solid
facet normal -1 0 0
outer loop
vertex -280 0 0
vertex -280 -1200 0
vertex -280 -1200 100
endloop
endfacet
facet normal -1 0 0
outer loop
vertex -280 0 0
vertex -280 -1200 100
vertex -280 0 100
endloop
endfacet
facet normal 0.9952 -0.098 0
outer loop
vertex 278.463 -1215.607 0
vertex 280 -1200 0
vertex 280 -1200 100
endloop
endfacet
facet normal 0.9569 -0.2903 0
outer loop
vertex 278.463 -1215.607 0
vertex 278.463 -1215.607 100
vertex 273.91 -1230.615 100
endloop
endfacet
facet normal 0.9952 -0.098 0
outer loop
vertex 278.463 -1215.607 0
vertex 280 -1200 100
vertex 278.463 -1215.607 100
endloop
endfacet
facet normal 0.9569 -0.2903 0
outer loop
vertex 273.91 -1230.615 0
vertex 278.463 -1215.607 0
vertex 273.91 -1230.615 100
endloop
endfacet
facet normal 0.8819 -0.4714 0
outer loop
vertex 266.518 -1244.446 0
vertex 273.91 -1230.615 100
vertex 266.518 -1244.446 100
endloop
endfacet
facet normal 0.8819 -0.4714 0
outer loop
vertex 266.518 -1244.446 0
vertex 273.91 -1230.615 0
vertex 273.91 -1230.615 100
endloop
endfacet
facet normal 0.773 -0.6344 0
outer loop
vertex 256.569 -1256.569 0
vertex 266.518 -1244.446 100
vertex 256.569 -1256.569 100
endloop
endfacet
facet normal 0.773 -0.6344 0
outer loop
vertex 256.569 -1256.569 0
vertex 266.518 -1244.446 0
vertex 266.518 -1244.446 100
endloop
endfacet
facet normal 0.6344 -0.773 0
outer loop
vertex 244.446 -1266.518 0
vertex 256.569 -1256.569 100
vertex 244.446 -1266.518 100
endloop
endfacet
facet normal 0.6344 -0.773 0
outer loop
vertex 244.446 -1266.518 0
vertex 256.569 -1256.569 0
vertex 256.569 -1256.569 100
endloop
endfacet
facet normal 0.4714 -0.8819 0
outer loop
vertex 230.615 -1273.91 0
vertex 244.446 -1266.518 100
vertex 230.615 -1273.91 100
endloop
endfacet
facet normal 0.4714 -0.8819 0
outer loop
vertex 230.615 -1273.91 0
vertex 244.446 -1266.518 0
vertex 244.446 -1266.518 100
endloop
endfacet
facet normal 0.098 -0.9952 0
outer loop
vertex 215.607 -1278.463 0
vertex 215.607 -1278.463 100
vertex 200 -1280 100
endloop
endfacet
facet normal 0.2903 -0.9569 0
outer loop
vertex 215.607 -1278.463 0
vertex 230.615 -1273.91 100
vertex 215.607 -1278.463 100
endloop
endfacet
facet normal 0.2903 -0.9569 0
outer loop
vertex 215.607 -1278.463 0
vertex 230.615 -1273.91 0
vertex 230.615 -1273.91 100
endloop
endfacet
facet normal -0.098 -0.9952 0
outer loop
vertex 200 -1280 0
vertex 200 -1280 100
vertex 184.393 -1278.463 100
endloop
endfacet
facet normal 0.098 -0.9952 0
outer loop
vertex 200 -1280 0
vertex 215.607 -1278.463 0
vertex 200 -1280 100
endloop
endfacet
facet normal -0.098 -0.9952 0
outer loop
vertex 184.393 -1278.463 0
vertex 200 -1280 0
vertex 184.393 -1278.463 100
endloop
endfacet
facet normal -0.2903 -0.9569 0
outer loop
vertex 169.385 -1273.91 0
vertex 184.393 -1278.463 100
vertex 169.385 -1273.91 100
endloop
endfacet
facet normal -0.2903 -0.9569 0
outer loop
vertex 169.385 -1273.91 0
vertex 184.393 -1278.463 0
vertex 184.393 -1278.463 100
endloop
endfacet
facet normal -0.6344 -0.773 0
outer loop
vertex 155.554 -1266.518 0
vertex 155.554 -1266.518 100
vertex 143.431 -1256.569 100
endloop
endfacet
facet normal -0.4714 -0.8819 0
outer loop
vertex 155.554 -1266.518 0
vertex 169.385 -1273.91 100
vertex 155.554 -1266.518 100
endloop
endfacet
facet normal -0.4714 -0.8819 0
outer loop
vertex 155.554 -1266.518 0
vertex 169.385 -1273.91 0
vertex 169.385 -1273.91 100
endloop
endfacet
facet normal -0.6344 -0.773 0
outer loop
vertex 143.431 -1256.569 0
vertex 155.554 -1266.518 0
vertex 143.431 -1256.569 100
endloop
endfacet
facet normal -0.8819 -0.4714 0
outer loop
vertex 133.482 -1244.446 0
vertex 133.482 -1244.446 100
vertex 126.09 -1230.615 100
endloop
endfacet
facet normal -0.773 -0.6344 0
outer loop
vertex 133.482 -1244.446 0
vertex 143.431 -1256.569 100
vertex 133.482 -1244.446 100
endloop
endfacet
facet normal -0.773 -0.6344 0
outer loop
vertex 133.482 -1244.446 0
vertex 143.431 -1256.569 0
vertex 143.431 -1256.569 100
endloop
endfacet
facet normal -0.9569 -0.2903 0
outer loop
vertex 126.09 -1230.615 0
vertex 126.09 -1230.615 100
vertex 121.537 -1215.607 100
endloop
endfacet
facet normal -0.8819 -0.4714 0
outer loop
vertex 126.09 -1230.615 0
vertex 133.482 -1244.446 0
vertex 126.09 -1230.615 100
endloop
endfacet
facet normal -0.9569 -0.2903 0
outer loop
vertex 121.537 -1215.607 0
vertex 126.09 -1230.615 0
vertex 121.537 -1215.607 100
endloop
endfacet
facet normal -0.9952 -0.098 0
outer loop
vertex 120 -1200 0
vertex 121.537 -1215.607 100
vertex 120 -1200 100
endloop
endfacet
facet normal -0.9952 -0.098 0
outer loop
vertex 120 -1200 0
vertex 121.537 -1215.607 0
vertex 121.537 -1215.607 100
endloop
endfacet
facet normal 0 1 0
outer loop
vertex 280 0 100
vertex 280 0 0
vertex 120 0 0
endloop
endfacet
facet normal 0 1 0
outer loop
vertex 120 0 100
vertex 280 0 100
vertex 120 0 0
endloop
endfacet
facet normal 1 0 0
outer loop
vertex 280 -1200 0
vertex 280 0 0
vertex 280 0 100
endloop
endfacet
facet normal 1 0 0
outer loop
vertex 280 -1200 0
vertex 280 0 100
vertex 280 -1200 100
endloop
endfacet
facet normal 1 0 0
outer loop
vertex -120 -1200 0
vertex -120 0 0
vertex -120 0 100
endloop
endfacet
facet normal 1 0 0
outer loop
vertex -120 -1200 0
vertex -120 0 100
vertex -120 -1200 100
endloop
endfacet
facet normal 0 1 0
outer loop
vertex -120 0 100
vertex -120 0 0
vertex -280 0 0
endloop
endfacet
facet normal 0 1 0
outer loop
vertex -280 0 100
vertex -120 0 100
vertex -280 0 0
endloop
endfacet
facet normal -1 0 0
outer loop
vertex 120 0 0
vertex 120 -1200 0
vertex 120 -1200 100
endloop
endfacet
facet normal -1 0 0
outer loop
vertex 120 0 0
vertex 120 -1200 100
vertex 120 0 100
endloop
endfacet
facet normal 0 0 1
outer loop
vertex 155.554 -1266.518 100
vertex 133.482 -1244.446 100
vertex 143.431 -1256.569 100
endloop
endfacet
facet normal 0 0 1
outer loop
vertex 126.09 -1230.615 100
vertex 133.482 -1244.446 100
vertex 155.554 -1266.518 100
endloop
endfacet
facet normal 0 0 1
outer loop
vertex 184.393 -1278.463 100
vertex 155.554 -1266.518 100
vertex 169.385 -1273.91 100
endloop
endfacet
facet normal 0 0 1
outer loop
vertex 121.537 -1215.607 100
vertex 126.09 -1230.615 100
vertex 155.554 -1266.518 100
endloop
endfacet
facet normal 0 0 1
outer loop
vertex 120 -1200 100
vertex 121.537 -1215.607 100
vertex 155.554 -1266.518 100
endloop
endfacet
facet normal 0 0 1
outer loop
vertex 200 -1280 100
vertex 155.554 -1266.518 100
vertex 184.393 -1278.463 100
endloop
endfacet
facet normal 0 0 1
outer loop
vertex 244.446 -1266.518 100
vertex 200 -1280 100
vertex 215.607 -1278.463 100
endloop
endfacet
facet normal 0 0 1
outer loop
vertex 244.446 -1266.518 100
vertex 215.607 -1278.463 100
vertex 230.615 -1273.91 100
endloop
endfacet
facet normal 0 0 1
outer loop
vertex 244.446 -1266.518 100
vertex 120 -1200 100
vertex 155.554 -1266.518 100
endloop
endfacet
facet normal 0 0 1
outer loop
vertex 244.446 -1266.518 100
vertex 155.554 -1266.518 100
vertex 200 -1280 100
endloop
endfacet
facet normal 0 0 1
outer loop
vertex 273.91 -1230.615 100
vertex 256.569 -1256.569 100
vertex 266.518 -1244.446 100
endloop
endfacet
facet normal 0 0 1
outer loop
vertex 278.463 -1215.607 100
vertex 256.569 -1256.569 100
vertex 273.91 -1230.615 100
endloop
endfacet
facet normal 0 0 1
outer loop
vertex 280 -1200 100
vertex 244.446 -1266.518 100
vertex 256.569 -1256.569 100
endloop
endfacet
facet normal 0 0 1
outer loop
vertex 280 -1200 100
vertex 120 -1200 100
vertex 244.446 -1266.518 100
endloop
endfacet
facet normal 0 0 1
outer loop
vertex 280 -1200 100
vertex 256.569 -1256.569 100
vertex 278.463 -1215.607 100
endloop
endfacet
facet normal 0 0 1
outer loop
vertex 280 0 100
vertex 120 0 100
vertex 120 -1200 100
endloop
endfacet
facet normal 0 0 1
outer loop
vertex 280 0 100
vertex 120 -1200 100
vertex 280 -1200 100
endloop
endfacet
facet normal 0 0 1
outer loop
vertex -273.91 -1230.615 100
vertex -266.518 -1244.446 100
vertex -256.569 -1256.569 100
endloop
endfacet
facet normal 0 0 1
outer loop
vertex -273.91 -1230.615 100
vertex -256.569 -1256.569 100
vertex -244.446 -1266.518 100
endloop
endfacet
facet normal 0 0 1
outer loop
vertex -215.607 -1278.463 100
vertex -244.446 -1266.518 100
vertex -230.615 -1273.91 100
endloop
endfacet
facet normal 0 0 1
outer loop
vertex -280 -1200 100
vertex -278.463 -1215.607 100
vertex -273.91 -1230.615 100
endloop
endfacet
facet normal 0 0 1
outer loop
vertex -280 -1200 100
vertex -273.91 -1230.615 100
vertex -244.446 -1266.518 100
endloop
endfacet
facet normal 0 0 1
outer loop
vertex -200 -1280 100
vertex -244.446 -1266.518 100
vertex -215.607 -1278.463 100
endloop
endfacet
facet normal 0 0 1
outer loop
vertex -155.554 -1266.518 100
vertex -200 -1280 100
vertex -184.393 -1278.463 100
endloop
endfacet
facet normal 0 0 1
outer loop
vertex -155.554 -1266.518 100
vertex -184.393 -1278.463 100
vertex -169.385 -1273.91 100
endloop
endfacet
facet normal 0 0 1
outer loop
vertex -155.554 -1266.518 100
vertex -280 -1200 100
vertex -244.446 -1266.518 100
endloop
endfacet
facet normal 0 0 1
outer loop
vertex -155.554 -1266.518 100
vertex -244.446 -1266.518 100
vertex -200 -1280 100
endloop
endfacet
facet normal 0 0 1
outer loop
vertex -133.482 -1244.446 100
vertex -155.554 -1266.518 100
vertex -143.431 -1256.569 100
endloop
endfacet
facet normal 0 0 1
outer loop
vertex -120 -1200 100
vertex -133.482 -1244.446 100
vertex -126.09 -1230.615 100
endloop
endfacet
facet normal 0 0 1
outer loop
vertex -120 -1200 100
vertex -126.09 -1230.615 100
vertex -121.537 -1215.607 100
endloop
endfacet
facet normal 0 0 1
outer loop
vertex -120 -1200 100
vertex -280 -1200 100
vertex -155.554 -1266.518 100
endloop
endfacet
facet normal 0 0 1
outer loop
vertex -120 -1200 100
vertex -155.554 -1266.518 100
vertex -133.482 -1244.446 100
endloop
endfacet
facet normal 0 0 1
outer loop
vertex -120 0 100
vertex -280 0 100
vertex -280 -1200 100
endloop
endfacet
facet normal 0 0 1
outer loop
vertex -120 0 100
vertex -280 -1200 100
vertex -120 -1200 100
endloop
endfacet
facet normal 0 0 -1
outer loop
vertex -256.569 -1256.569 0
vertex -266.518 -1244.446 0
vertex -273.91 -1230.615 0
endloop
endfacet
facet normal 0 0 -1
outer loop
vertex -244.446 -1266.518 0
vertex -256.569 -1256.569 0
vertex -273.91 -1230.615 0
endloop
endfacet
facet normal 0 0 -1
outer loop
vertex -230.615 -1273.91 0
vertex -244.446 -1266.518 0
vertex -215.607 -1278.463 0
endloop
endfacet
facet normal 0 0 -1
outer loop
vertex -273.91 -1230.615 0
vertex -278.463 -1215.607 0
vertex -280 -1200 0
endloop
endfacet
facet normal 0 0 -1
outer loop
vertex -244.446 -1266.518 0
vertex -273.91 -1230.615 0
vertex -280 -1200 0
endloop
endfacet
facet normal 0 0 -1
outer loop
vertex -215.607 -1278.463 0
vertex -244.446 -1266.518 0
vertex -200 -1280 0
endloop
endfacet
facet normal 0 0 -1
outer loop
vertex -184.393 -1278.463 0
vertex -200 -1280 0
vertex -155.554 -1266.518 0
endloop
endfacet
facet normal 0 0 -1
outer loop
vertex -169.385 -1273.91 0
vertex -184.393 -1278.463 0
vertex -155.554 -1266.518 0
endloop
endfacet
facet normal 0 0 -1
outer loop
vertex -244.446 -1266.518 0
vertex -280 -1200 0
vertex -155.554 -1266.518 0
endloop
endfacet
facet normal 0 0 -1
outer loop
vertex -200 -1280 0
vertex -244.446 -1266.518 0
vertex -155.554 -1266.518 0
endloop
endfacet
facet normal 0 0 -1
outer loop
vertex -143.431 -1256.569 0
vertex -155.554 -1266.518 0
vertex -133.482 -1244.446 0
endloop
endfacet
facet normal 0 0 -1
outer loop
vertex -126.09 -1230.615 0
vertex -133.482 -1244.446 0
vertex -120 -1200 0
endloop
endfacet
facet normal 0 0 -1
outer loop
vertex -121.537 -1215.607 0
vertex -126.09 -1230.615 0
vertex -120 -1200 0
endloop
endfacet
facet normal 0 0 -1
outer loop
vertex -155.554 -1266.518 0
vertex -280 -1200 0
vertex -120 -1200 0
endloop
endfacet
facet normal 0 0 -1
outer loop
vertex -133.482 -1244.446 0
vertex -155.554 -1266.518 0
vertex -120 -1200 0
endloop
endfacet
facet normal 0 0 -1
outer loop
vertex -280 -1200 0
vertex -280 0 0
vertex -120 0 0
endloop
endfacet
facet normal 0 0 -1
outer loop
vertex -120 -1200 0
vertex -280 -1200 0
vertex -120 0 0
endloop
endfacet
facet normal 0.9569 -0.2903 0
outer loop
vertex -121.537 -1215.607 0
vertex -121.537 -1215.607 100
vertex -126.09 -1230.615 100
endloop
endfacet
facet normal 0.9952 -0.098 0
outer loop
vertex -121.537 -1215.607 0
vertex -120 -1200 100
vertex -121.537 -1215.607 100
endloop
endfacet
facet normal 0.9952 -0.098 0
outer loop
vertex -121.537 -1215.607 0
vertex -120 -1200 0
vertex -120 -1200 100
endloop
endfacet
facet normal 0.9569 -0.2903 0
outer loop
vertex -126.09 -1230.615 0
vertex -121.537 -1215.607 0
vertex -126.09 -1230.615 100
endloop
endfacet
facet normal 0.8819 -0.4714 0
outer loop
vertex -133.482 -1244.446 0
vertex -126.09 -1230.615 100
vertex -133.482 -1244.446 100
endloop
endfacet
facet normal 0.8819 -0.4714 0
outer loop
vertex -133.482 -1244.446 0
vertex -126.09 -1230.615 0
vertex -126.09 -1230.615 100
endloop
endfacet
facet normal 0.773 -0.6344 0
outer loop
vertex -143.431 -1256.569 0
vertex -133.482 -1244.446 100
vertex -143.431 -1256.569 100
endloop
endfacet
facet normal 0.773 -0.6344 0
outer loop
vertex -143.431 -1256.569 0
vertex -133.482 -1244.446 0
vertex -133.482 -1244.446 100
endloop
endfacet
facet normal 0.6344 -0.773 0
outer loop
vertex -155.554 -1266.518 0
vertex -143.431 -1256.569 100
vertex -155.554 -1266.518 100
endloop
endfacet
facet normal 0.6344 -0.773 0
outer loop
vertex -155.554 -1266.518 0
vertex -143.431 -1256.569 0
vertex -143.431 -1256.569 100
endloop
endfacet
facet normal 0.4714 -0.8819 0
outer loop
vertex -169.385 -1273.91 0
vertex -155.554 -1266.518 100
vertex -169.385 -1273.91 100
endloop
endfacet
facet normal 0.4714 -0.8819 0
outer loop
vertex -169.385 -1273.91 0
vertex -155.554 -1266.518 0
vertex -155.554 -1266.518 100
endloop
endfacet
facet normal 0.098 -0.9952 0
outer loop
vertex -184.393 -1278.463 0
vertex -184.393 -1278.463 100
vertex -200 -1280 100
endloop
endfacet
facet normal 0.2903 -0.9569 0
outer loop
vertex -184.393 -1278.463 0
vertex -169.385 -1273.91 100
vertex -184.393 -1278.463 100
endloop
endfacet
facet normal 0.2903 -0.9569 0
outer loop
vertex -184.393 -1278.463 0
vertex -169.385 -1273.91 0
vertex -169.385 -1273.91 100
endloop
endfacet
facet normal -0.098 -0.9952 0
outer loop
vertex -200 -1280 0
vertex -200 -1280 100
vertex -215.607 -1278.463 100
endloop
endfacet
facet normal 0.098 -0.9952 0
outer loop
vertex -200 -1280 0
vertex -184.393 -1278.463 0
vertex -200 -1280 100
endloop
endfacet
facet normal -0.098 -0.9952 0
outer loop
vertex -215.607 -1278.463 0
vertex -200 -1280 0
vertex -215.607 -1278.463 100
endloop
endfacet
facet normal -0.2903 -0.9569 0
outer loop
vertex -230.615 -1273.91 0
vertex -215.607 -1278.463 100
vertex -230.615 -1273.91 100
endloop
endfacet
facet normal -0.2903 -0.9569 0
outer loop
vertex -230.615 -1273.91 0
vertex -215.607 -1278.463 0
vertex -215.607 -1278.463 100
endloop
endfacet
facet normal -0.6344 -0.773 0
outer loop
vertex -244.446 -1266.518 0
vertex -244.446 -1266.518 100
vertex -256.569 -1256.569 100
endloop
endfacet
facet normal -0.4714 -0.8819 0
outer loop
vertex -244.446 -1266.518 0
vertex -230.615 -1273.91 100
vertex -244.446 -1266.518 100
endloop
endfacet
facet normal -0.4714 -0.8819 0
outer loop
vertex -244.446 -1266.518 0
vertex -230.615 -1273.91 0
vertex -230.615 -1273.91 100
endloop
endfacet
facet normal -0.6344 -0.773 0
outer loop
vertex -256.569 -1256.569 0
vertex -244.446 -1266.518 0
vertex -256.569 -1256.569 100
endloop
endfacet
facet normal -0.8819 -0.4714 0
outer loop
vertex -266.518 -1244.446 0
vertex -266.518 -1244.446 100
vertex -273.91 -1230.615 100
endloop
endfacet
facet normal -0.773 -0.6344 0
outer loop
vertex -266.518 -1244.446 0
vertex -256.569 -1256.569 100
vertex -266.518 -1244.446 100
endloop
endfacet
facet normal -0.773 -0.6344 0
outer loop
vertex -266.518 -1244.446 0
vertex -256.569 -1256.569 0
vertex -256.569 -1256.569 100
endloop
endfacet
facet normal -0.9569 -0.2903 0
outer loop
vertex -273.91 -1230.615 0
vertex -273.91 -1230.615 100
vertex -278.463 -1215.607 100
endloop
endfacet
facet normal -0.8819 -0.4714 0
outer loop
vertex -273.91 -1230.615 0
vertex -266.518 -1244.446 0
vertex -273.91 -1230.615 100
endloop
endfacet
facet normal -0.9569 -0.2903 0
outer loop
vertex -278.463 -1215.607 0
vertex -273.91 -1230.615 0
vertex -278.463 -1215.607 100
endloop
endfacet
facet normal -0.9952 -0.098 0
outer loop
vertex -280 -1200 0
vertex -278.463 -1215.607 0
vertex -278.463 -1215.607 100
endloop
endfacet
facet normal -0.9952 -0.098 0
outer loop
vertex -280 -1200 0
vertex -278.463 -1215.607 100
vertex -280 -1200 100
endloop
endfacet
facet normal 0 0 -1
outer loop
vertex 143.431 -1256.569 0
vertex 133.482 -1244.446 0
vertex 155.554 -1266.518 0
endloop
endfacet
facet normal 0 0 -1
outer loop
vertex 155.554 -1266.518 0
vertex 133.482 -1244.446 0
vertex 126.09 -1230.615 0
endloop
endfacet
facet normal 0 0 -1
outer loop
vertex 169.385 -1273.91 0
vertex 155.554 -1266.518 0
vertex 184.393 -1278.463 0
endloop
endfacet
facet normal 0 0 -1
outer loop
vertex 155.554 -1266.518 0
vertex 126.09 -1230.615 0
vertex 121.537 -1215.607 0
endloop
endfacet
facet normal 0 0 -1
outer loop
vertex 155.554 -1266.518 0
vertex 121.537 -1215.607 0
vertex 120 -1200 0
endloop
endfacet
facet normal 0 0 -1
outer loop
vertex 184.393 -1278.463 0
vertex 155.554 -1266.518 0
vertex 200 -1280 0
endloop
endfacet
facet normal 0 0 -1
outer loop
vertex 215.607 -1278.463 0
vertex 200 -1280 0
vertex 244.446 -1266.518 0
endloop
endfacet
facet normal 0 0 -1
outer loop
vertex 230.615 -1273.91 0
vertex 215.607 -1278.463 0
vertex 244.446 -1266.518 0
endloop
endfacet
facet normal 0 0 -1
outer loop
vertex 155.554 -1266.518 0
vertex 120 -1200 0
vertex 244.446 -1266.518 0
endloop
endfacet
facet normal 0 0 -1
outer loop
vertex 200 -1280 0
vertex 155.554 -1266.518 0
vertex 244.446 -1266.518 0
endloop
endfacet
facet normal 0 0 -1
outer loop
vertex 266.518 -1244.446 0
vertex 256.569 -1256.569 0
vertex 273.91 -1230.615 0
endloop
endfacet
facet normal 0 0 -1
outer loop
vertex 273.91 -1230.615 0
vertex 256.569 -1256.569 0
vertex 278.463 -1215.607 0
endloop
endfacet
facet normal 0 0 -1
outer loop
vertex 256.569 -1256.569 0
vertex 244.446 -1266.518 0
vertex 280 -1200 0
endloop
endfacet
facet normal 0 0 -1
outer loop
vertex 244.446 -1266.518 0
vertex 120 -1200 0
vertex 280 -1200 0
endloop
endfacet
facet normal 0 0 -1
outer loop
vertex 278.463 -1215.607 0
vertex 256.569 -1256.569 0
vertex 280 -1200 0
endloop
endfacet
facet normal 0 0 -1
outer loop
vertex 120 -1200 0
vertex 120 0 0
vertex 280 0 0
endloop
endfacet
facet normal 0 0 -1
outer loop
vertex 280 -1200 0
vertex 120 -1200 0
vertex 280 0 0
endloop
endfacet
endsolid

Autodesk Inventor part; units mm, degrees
ref_plane "YZ Plane" through (0, 0, 0) normal (1, 0, 0) x (0, 1, 0)
ref_plane "XZ Plane" through (0, 0, 0) normal (0, 1, 0) x (-1, 0, 0)
ref_plane "XY Plane" through (0, 0, 0) normal (0, 0, 1) x (1, 0, 0)
sketch "Sketch1" plane through (0, 0, 0) normal (0, 0, 1) x (1, 0, 0)
  line L0 (280, 0) -> (280, -1200)
  arc A0 (120, -1200) -> (280, -1200) centre (200, -1200) ccw
  line L1 (120, -1200) -> (120, 0)
  line L2 (-120, 0) -> (-120, -1200)
  arc A1 (-280, -1200) -> (-120, -1200) centre (-200, -1200) ccw
  line L3 (-280, -1200) -> (-280, 0)
  line L4 (280, 0) -> (-280, 0)
  line L5 (0, 0) -> (0, -1425.5319) construction
  dimension "d0" = 160
  dimension "d1" = 560
  dimension "d2" = 1200
extrude "Extrusion1" add sketch "Sketch1" along normal blind 100
sketch "Sketch2" plane through (0, 0, 100) normal (0, 0, 1) x (1, 0, 0)
  arc A0 (-280, -1200) -> (-120, -1200) centre (-200, -1200) ccw projected
  line L0 (-120, -1200) -> (-120, 0) projected
  line L1 (-120, 0) -> (-280, 0) projected
  line L2 (-280, 0) -> (-280, -1200) projected
  line L3 (280, 0) -> (120, 0) projected
  line L4 (120, 0) -> (120, -1200) projected
  arc A1 (120, -1200) -> (280, -1200) centre (200, -1200) ccw projected
  line L5 (280, -1200) -> (280, 0) projected
  line L6 (-280, -1060) -> (-200, -1060)
  line L7 (-200, -1060) -> (-200, -500)
  line L8 (-200, -500) -> (-280, -500)
  line L9 (-280, -500) -> (-280, -1060)
  line L10 (200, -1060) -> (280, -1060)
  line L11 (280, -1060) -> (280, -500)
  line L12 (280, -500) -> (200, -500)
  line L13 (200, -500) -> (200, -1060)
  line L14 (-200, -500) -> (200, -500)
  line L15 (200, -500) -> (200, -580)
  line L16 (200, -580) -> (-200, -580)
  line L17 (-200, -580) -> (-200, -500)
  line L18 (-280, 0) -> (-280, -1200) projected
  line L19 (280, -1200) -> (280, 0) projected
  point P0 (0, 0)
  point P1 (-200, -580)
  dimension "d5" = 80
  dimension "d6" = 560
  dimension "d7" = 560
  dimension "d8" = 400
  dimension "d9" = 500
extrude "Extrusion2" [suppressed]
sketch "Sketch3" plane through (0, 0, 140) normal (0, 0, 1) x (1, 0, 0)
  line L0 (-280, -500) -> (-280, -1060) projected
  line L1 (-280, -1060) -> (-200, -1060) projected
  line L2 (-200, -1060) -> (-200, -580) projected
  line L3 (-200, -580) -> (200, -580) projected
  line L4 (200, -580) -> (200, -1060) projected
  line L5 (200, -1060) -> (280, -1060) projected
  line L6 (280, -1060) -> (280, -500) projected
  line L7 (280, -500) -> (-280, -500) projected
  line L8 (-280, -1060) -> (-240, -1060)
  line L9 (-240, -1060) -> (-240, -1020)
  line L10 (-240, -1020) -> (-280, -1020)
  line L11 (-280, -1020) -> (-280, -1060)
  line L12 (-280, -500) -> (-240, -500)
  line L13 (-240, -500) -> (-240, -540)
  line L14 (-240, -540) -> (-280, -540)
  line L15 (-280, -540) -> (-280, -500)
  line L16 (280, -500) -> (240, -500)
  line L17 (240, -500) -> (240, -540)
  line L18 (240, -540) -> (280, -540)
  line L19 (280, -540) -> (280, -500)
  line L20 (280, -1060) -> (240, -1060)
  line L21 (240, -1060) -> (240, -1020)
  line L22 (240, -1020) -> (280, -1020)
  line L23 (280, -1020) -> (280, -1060)
  point P0 (0, 0)
  dimension "d12" = 40
extrude "Extrusion3" [suppressed]
equation "\"d7\" = d6"
properties part number "pallet jack dummy"
